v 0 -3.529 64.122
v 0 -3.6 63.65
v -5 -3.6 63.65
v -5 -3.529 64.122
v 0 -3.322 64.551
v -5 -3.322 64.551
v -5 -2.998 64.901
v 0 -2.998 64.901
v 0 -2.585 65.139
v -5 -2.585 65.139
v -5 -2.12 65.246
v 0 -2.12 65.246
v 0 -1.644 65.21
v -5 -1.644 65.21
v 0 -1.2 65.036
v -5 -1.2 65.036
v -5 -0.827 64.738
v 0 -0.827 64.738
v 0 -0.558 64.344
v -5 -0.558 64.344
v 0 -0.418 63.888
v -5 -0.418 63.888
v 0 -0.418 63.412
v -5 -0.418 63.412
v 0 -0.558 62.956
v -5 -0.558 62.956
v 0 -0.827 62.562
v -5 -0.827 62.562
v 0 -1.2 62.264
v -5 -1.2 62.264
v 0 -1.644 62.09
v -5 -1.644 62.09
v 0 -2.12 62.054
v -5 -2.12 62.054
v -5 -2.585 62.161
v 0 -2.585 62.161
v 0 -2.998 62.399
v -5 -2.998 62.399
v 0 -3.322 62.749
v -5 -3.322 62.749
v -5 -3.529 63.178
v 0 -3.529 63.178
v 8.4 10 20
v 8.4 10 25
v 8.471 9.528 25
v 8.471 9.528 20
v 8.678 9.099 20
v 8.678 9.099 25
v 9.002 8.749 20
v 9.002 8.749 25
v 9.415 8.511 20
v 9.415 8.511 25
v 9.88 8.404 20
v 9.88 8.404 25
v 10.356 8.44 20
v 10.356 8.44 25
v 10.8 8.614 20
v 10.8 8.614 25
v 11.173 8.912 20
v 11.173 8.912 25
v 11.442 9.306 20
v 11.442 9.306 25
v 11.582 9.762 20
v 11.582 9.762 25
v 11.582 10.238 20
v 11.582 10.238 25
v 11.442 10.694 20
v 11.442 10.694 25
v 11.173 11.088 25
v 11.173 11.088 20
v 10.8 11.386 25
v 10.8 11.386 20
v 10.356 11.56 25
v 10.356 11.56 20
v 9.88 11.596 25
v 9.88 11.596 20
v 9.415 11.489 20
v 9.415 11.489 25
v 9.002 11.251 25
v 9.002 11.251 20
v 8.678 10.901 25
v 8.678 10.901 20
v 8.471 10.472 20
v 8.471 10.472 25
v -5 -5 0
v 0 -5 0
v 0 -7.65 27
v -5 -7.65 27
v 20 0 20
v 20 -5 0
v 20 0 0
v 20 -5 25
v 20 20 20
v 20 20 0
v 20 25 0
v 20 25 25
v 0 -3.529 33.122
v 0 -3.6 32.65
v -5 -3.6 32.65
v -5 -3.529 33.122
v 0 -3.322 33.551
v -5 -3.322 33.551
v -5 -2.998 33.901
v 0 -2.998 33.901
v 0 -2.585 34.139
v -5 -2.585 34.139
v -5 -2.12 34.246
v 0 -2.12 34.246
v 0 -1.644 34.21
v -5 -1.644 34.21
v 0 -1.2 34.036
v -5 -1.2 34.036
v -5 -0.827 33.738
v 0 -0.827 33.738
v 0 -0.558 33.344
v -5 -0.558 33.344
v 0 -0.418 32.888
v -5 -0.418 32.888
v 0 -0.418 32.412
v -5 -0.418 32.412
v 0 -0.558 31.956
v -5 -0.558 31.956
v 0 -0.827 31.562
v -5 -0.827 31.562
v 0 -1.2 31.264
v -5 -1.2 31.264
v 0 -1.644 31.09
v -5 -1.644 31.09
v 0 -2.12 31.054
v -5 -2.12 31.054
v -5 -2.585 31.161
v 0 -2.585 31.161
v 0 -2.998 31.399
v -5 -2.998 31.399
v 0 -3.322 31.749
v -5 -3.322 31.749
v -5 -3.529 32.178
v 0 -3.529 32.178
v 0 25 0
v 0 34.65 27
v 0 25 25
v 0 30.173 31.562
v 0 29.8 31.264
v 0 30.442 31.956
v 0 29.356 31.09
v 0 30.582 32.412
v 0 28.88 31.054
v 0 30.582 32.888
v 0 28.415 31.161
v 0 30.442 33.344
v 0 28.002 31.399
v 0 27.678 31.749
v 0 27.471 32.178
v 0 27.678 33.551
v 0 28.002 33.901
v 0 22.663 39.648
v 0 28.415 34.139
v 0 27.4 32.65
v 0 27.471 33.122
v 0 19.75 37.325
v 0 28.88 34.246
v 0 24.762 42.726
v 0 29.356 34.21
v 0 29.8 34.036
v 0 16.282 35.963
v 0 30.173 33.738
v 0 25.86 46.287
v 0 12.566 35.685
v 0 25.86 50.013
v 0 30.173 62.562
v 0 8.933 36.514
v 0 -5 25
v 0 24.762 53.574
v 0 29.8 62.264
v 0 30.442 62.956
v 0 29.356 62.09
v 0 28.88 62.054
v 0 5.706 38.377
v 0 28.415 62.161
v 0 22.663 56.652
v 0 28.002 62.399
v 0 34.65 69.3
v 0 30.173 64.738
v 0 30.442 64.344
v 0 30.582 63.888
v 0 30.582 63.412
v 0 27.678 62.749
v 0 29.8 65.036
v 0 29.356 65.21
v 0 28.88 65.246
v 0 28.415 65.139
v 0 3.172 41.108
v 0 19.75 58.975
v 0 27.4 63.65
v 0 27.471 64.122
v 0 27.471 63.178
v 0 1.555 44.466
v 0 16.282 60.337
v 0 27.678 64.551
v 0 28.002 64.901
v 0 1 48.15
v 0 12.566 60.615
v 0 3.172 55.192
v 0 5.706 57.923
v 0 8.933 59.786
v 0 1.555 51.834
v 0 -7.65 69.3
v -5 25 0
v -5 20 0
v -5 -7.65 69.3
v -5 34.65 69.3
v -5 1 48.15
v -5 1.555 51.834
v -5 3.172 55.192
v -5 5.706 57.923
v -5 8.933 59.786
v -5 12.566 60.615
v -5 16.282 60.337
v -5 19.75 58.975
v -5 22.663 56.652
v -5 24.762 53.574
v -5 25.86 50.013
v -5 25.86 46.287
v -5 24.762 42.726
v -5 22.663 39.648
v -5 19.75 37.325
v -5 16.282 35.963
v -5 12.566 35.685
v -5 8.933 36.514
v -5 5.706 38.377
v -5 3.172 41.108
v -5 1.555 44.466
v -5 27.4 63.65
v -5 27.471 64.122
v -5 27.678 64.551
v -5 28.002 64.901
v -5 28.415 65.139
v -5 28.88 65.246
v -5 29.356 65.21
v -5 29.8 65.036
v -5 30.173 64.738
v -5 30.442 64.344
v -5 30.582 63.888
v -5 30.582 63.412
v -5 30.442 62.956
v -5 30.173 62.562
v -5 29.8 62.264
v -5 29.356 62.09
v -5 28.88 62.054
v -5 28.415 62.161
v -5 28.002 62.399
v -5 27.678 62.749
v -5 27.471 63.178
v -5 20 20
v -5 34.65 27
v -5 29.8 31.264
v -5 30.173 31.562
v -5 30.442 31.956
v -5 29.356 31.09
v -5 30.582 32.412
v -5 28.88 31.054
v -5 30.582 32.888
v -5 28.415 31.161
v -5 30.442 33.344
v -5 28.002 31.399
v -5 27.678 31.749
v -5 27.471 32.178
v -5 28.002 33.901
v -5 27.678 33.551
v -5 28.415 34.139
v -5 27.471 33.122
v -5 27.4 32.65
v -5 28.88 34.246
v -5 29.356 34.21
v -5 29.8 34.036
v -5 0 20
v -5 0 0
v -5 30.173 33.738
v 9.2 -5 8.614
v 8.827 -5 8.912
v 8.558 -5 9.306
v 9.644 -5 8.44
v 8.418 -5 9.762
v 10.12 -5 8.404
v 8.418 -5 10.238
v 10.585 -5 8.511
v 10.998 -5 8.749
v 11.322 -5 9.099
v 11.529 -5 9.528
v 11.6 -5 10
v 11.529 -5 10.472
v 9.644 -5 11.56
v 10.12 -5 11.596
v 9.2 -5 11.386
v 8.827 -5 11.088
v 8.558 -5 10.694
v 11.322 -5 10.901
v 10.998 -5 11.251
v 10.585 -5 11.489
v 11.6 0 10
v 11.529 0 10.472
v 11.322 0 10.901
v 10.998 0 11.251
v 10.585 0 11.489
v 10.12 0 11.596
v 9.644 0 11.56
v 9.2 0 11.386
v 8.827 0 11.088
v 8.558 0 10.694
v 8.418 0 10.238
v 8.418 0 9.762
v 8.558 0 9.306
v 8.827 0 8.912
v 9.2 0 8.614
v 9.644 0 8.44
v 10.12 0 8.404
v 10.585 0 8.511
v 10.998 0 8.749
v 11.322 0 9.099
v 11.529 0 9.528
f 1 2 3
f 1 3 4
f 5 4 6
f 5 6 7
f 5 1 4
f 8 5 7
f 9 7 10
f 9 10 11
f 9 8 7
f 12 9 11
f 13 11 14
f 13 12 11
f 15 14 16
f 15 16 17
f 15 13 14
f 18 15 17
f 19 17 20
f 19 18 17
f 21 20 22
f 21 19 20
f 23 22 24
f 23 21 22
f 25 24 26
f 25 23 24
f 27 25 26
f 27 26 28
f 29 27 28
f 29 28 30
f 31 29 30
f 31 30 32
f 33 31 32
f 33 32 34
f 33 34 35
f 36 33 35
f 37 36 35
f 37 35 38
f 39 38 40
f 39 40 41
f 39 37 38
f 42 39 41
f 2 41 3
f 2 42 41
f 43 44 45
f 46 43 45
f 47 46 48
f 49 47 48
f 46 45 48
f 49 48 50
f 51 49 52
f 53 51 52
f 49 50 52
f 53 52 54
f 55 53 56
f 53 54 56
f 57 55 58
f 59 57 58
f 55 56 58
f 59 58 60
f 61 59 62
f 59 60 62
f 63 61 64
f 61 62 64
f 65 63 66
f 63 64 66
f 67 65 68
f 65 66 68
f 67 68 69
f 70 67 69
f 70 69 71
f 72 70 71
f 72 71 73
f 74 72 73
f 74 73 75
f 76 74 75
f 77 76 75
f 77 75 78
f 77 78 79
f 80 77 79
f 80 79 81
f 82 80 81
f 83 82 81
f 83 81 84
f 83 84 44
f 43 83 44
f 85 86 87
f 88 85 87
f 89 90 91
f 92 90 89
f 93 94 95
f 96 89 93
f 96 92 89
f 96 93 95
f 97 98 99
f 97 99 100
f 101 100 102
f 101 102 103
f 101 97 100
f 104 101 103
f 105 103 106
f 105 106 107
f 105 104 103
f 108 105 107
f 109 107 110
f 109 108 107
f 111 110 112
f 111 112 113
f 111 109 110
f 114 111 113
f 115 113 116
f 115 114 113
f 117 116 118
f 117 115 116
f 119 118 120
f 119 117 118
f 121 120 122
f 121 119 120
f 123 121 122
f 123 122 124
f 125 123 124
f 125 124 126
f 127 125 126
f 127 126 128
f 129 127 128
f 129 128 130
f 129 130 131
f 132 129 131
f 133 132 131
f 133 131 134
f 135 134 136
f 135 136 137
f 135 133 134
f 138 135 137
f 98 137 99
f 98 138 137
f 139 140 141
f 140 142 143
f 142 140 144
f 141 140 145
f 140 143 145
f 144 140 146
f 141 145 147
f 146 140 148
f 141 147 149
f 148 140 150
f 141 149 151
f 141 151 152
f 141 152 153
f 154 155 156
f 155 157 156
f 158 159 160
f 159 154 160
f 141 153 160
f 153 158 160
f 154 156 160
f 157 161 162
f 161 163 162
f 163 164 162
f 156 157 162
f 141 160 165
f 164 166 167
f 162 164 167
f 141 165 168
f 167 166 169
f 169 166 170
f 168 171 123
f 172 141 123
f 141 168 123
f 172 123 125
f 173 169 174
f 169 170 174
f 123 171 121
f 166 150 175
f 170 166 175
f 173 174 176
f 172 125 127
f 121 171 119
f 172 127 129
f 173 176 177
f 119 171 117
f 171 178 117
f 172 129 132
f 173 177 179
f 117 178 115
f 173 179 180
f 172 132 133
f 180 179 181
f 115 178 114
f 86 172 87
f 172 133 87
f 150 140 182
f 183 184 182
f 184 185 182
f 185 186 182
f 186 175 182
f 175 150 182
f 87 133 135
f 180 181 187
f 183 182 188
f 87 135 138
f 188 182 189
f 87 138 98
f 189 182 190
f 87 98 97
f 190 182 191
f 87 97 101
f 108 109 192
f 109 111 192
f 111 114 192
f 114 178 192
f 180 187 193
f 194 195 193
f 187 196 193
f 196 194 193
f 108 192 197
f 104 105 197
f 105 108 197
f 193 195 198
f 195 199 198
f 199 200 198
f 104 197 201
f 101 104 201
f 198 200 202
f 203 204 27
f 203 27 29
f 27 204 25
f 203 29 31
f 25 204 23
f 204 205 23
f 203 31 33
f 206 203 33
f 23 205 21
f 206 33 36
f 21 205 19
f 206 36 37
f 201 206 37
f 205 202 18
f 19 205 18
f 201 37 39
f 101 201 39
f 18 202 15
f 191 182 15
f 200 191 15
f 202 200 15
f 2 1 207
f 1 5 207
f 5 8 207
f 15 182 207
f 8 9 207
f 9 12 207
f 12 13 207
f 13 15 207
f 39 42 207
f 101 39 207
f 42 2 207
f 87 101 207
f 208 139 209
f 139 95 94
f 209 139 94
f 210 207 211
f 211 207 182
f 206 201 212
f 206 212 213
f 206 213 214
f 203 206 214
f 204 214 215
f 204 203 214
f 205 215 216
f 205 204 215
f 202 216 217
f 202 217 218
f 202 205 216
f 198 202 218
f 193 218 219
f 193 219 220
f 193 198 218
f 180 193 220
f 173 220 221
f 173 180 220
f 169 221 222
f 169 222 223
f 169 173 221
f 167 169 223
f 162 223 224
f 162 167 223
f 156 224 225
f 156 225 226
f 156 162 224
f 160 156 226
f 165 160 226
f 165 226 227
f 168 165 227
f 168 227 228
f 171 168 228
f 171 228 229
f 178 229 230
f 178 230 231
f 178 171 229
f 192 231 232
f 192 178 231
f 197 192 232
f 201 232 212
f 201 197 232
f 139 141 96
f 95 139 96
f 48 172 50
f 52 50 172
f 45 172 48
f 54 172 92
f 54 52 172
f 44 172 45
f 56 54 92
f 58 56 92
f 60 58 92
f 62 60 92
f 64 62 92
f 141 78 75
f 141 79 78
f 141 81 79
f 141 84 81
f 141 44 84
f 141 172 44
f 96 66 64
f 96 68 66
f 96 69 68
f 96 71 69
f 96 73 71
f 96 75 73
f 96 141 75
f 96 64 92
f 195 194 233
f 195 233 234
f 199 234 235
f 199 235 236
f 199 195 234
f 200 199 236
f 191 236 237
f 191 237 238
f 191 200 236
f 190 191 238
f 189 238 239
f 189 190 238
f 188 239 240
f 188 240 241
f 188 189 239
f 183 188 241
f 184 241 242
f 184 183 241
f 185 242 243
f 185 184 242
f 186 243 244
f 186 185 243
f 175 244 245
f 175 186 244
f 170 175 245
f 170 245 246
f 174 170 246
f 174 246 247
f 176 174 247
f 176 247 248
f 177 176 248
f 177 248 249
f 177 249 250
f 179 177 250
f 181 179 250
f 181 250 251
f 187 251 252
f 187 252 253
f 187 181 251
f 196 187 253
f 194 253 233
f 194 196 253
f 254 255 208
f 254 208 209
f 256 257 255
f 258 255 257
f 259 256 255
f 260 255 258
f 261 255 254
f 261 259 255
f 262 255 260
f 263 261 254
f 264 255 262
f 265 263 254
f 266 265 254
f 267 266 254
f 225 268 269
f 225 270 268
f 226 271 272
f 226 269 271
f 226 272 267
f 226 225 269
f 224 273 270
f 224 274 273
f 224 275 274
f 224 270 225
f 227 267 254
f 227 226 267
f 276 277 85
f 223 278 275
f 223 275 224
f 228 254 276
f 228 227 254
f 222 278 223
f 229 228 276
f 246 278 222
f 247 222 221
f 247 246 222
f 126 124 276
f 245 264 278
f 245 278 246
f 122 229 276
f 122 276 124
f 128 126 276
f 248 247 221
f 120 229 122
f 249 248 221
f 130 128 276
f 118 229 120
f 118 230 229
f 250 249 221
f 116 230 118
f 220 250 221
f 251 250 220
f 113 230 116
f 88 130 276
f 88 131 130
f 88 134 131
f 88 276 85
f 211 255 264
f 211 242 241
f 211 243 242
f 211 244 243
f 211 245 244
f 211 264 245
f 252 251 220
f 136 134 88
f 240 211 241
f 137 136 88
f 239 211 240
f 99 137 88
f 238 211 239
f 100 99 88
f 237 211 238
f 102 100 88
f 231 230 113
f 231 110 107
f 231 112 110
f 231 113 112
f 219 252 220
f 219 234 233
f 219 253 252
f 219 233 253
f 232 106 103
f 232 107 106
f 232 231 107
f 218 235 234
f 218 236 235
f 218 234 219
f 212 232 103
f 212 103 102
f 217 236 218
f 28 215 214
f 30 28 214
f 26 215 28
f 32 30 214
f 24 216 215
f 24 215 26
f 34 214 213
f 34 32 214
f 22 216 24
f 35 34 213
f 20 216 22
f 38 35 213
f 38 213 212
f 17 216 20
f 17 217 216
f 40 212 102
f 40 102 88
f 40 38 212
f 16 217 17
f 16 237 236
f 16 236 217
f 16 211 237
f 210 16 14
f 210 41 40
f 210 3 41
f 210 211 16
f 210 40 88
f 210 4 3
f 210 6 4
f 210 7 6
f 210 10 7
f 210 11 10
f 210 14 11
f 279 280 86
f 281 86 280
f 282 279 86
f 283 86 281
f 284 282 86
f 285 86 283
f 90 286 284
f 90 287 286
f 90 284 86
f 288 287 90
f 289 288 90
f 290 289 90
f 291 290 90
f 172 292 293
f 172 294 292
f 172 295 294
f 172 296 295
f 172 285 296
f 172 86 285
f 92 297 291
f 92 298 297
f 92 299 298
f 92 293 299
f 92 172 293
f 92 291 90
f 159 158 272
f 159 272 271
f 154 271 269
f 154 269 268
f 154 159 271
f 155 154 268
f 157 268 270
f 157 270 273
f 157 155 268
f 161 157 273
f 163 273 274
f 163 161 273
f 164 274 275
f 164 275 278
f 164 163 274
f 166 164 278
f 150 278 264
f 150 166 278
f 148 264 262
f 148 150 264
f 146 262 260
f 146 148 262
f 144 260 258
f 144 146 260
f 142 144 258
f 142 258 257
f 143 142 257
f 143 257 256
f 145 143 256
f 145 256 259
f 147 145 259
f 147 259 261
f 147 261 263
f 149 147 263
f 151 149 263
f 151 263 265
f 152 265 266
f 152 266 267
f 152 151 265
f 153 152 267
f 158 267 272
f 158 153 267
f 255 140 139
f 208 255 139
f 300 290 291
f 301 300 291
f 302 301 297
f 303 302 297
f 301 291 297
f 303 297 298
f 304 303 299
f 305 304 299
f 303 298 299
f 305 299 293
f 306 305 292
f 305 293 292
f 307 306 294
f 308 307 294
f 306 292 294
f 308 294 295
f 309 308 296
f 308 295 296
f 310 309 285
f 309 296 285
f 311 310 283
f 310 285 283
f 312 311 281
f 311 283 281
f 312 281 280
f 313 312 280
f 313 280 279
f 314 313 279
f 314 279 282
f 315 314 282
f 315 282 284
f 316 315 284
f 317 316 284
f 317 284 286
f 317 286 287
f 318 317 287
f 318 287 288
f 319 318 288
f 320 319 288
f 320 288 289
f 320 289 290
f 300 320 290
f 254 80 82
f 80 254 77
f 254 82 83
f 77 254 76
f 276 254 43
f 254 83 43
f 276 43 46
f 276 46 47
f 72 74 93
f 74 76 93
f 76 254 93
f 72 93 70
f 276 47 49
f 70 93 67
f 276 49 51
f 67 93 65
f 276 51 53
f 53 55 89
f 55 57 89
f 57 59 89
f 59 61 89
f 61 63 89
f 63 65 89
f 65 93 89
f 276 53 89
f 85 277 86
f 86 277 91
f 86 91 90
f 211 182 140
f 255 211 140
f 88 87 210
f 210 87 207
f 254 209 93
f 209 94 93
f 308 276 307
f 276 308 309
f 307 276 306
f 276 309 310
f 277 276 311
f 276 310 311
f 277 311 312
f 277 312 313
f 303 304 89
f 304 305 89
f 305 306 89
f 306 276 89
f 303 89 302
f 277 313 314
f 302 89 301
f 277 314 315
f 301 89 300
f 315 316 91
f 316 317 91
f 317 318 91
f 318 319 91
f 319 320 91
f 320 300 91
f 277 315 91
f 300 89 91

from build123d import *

# Parameters (mm, degrees)
F0_W       = 20
F0_H       = 25
F1_DEPTH   = 5
F2_W       = 20
F2_H       = 5
F3_DEPTH   = 20
F6_D       = 3.2
F6_ON_F5_D = 3.2
F7_W       = 20
F7_H       = 5
F8_DEPTH   = 25
F9_R       = 1.6
F9_R_2     = 12.5
F10_DEPTH  = 5


with BuildPart() as f1:
    # F0 (on Front) → F1 (new body)
    with BuildSketch(Plane.XZ):
        with Locations((10, 12.5)):
            Rectangle(F0_W, F0_H)
    extrude(amount=F1_DEPTH)

    # F2 (on face) → F3 (join)
    with BuildSketch(Plane(origin=(0, 0, 0), x_dir=(-1, 0, 0), z_dir=(0, 1, 0))):
        with Locations((-10, 22.5)):
            Rectangle(F2_W, F2_H)
    extrude(amount=F3_DEPTH)

    # F6 (through all)
    with Locations(Plane(origin=(0, 0, 0), x_dir=(-1, 0, 0), z_dir=(0, 1, 0))):
        with Locations((-10, 10)):
            Hole(F6_D / 2)

    # F6 on F5 (through all)
    with Locations(Plane(origin=(0, 0, 20), x_dir=(1, 0, 0), z_dir=(0, 0, -1))):
        with Locations((10, -10)):
            Hole(F6_ON_F5_D / 2)

    # F7 (on face) → F8 (join)
    with BuildSketch(Plane.XY.offset(25)):
        with Locations((10, 22.5)):
            Rectangle(F7_W, F7_H)
    extrude(amount=-F8_DEPTH)

    # F9 (on face) → F10 (join)
    with BuildSketch(Plane(origin=(0, 0, 0), x_dir=(0, -1, 0), z_dir=(-1, 0, 0))):
        Polygon((7.65, 27), (7.65, 69.3), (-34.65, 69.3), (-34.65, 27), (-25, 0), (-20, 0), (-20, 20), (0, 20), (0, 0), (5, 0), align=None)
        with Locations((-29, 32.65)):
            Circle(F9_R, mode=Mode.SUBTRACT)
        with Locations((2, 32.65)):
            Circle(F9_R, mode=Mode.SUBTRACT)
        with Locations((-29, 63.65)):
            Circle(F9_R, mode=Mode.SUBTRACT)
        with Locations((-13.5, 48.15)):
            Circle(F9_R_2, mode=Mode.SUBTRACT)
        with Locations((2, 63.65)):
            Circle(F9_R, mode=Mode.SUBTRACT)
    extrude(amount=F10_DEPTH)


solid = f1.part
